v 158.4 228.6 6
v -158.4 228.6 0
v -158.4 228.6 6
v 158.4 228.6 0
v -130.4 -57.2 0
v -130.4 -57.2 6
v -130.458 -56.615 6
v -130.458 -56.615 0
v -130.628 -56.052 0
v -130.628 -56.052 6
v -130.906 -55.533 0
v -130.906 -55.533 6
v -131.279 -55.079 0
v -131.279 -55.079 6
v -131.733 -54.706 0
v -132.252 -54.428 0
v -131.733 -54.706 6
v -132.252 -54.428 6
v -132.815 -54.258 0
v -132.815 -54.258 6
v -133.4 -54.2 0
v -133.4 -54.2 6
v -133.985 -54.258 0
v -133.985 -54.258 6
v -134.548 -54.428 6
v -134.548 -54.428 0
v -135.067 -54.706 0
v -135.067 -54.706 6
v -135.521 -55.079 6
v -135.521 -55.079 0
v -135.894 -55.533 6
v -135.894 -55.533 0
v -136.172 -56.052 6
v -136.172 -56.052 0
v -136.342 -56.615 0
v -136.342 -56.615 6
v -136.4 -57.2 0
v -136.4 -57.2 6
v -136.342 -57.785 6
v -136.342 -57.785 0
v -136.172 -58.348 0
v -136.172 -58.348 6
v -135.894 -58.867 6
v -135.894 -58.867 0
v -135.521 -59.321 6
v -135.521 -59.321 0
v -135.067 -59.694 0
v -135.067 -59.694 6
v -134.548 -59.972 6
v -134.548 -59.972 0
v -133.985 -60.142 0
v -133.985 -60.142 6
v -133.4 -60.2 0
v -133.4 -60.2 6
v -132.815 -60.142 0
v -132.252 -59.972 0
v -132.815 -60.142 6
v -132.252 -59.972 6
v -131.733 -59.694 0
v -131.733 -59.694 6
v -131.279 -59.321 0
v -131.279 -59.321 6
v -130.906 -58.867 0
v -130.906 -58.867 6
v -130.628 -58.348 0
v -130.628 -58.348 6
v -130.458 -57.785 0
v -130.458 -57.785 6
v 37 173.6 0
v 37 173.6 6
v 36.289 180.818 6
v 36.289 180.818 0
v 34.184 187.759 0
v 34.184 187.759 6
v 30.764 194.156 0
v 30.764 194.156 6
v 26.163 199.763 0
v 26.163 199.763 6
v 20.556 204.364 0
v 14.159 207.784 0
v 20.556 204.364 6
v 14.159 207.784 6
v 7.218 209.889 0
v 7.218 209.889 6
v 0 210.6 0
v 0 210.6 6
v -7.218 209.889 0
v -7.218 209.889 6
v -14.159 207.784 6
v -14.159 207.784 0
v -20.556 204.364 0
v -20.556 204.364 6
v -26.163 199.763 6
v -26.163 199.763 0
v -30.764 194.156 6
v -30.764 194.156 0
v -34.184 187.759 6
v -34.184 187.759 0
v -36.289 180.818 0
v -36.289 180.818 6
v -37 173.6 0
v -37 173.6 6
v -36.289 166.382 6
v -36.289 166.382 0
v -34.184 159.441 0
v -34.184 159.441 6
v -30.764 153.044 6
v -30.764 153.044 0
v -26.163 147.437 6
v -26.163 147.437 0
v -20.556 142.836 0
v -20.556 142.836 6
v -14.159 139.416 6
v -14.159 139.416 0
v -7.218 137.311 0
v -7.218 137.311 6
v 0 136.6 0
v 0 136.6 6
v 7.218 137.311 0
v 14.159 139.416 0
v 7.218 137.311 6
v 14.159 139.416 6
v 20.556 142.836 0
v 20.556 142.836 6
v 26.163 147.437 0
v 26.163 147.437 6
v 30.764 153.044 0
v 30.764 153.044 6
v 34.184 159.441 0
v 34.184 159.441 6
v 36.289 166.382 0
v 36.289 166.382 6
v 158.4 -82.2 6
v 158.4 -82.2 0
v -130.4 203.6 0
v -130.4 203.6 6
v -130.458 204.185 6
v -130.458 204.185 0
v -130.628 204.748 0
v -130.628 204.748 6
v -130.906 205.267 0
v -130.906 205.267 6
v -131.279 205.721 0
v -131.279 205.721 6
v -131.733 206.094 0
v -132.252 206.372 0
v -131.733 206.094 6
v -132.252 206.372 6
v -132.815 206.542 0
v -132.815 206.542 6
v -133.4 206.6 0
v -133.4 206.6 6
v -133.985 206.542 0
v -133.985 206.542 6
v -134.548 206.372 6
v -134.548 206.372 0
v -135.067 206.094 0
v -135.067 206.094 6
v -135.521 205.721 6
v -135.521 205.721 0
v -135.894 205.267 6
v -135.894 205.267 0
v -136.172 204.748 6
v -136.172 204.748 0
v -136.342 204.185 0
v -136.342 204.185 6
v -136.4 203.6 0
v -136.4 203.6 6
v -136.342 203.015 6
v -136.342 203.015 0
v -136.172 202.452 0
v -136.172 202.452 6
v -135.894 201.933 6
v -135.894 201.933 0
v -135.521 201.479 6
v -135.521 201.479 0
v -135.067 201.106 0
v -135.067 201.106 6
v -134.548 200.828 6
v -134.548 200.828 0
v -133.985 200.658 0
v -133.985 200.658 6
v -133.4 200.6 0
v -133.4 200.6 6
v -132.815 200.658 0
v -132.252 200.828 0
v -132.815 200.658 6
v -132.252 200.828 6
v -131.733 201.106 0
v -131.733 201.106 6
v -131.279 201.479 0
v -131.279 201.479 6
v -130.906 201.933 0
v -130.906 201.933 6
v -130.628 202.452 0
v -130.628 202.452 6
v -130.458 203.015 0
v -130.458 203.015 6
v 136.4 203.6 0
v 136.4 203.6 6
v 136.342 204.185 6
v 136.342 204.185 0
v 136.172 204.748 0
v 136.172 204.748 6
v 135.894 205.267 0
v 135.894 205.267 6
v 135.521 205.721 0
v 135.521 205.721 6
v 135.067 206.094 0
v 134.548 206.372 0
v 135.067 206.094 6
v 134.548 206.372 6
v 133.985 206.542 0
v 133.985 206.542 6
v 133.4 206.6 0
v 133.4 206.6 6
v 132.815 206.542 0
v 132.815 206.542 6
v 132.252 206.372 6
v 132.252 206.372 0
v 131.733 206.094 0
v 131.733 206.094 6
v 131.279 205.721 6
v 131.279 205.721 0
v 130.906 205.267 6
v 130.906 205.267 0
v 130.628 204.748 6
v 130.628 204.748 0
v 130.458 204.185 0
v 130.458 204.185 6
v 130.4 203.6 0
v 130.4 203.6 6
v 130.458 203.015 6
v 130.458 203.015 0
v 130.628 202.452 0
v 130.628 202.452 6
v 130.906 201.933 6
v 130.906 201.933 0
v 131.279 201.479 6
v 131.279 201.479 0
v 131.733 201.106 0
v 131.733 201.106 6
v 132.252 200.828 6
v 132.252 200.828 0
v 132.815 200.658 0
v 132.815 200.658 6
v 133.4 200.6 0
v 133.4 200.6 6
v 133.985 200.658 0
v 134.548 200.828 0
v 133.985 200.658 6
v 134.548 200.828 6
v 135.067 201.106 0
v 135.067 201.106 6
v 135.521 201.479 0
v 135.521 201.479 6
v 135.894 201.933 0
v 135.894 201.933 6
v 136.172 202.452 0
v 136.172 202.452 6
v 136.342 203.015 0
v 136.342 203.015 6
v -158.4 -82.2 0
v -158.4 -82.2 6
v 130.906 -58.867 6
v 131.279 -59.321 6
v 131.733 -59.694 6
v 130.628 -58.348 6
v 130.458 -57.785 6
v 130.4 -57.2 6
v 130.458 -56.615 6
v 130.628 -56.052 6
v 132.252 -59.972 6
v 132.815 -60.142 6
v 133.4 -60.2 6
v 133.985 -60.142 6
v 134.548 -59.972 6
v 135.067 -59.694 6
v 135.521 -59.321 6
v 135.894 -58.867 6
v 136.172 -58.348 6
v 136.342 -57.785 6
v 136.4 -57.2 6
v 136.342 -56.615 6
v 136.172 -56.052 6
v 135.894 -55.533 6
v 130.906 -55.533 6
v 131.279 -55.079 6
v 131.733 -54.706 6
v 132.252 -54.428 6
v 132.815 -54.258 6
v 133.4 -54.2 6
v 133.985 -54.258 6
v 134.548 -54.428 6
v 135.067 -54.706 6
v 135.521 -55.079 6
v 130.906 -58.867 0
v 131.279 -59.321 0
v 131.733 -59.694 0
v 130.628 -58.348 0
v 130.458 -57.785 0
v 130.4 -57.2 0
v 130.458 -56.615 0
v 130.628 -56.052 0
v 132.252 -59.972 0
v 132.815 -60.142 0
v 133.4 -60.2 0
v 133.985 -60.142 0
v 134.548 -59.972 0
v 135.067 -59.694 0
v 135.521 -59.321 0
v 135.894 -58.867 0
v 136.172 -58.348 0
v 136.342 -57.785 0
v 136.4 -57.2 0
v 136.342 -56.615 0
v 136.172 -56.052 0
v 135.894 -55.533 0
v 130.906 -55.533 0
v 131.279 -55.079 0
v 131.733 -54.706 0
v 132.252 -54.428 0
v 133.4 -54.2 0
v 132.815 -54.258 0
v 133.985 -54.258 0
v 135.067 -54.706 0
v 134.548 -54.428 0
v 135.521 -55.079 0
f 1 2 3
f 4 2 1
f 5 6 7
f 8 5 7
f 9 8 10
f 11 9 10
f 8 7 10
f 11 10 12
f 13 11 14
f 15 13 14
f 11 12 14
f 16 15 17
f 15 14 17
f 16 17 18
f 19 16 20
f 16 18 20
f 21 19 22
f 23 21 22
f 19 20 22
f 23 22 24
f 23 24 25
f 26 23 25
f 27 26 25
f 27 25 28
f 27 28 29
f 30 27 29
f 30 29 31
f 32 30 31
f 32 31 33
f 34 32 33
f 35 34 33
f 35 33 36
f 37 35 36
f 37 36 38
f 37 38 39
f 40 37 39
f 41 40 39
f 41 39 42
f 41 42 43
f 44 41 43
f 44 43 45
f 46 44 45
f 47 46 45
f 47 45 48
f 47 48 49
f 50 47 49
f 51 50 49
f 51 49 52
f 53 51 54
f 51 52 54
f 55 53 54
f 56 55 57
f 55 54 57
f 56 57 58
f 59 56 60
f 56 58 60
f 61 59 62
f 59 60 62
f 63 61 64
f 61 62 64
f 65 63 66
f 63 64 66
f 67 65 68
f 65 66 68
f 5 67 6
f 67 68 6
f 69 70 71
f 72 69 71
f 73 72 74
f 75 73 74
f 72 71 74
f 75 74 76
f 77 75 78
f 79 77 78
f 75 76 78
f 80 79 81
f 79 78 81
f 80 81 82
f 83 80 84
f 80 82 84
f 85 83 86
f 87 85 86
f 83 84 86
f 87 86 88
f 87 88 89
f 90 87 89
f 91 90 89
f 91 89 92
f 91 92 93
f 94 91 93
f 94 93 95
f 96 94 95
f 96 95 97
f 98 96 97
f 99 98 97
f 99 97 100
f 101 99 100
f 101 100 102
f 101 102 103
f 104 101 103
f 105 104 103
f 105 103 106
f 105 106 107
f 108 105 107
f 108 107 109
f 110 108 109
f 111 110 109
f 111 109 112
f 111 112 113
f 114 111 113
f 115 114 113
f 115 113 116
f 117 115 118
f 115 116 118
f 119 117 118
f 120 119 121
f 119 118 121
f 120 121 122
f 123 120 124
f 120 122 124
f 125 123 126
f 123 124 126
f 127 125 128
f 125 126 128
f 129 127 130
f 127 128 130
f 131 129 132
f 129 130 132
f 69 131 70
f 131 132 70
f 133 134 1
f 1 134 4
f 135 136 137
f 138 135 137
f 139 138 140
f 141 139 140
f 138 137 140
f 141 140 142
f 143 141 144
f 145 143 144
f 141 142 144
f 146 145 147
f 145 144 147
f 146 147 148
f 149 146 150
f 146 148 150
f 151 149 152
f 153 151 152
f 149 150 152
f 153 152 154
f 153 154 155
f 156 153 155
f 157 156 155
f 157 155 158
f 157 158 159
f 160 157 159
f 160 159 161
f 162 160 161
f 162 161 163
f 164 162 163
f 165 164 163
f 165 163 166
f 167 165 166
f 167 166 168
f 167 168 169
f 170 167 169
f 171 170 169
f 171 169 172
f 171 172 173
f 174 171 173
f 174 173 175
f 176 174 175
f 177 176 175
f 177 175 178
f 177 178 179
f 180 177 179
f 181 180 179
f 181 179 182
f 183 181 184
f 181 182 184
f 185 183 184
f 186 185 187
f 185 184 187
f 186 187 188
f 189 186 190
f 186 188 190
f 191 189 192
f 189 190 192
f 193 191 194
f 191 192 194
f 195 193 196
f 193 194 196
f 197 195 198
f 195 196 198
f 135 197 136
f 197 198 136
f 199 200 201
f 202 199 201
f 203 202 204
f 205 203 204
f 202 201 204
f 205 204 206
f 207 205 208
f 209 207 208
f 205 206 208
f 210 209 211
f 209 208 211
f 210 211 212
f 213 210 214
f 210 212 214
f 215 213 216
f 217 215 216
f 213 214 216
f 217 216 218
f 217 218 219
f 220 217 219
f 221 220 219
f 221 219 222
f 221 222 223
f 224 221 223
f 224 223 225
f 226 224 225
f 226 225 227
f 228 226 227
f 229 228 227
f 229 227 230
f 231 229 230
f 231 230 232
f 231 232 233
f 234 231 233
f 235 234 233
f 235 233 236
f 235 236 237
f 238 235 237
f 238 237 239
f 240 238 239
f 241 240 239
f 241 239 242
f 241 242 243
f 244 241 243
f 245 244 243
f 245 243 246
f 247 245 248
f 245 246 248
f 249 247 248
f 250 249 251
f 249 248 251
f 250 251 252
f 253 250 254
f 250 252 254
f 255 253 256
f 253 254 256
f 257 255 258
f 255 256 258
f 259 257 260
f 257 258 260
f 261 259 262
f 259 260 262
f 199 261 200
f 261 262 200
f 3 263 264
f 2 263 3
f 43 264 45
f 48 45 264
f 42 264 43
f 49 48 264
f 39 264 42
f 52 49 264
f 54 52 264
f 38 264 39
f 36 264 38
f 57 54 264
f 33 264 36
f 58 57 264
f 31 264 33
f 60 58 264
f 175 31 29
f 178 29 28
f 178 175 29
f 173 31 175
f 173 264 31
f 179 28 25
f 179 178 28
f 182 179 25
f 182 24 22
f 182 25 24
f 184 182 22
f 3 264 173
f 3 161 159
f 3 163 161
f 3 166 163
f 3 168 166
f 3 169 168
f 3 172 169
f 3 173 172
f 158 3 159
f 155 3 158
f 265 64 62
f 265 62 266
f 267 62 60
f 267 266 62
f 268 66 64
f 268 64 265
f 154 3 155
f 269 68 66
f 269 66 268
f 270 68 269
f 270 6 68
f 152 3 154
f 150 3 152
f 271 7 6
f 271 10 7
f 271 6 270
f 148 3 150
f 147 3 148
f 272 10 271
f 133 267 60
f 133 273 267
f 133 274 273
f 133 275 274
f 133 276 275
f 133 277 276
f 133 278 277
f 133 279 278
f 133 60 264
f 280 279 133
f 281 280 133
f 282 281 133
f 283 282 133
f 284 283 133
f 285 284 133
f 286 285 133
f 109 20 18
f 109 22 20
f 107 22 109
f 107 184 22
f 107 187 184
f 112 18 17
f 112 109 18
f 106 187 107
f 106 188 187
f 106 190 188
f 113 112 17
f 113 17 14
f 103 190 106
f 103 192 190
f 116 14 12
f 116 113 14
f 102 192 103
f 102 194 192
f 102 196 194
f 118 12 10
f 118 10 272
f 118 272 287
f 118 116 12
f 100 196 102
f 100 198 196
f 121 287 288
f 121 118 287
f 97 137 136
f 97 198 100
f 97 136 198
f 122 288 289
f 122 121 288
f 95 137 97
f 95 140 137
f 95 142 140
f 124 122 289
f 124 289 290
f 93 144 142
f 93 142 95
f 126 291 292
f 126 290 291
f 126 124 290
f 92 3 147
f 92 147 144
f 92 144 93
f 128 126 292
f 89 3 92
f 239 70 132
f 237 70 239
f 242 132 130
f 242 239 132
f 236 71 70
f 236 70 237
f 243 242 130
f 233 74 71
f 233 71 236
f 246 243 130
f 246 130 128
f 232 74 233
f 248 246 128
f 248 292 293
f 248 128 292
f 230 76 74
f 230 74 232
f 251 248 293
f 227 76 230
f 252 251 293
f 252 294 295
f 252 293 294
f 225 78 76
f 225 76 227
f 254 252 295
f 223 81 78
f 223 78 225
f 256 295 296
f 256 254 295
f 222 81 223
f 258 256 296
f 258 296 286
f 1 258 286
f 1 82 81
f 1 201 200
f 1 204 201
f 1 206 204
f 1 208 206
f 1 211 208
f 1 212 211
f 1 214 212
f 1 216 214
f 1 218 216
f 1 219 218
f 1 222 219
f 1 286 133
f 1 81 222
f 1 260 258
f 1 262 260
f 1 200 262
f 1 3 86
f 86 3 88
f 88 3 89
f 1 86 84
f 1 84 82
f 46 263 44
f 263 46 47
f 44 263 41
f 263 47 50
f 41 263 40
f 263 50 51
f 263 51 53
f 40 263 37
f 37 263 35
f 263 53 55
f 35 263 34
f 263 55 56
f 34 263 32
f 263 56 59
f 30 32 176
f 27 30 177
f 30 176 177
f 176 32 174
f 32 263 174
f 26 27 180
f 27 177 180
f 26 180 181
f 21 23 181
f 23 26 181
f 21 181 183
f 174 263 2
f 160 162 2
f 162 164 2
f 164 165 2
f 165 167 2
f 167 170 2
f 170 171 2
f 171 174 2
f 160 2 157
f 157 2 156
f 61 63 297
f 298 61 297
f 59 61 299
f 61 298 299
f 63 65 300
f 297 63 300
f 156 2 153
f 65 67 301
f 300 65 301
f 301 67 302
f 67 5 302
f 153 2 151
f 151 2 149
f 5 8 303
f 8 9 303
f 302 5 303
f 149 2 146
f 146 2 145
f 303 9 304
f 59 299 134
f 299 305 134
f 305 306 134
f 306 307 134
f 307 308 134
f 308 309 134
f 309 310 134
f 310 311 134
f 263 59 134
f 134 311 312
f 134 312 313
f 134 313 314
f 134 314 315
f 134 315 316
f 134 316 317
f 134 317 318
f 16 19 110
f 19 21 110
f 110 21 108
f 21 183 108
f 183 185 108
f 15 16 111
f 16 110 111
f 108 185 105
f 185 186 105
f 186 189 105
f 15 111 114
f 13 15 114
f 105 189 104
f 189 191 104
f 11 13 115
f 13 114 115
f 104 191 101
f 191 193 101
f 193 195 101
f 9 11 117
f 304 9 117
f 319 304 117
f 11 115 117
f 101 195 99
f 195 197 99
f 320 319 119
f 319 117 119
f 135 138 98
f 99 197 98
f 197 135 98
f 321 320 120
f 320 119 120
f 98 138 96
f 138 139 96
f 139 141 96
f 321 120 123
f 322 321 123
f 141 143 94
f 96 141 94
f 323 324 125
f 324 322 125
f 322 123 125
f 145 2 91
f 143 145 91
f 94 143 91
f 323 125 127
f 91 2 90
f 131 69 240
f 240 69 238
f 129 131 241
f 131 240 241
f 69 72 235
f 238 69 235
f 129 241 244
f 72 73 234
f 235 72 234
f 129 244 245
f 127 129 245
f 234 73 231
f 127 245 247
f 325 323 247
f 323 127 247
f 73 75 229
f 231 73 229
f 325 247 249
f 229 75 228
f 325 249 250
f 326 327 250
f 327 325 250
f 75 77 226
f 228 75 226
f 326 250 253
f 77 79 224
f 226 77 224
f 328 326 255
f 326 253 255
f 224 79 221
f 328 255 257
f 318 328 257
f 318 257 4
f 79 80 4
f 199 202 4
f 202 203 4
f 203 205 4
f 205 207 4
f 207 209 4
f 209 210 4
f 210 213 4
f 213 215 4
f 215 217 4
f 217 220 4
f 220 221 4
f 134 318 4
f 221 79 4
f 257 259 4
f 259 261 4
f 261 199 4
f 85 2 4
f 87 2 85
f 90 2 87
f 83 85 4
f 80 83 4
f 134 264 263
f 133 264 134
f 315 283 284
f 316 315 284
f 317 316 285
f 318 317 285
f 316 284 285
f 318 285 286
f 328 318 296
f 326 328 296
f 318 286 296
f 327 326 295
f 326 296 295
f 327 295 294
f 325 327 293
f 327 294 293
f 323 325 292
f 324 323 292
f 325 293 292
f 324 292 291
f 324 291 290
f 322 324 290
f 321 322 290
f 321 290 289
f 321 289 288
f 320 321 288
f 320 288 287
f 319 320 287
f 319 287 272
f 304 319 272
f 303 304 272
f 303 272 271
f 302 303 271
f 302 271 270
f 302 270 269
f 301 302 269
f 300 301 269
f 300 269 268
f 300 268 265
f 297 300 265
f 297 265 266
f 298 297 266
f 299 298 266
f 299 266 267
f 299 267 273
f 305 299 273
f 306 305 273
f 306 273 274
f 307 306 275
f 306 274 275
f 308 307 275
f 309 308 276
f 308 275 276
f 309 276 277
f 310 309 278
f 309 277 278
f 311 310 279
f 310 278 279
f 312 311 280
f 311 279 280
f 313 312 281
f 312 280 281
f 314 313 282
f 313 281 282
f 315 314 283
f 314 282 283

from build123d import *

# Parameters (mm, degrees)
SKETCH1_W           = 316.8
SKETCH1_H           = 457.2
BOSS_EXTRUDE1_DEPTH = 6
SKETCH2_R           = 37
CUT_EXTRUDE1_DEPTH  = 279.180732618
SKETCH3_W           = 316.8
SKETCH3_H           = 146.4
CUT_EXTRUDE2_DEPTH  = 279.180732618
SKETCH4_R           = 3
CUT_EXTRUDE3_DEPTH  = 279.180732618


with BuildPart() as part:
    # Sketch1 → Boss-Extrude1 (new body)
    with BuildSketch(Plane.XY):
        Rectangle(SKETCH1_W, SKETCH1_H)
    extrude(amount=BOSS_EXTRUDE1_DEPTH)

    # Sketch2 → Cut-Extrude1 (cut, through all)
    with BuildSketch(Plane.XY.offset(6)):
        with Locations((0, 173.6)):
            Circle(SKETCH2_R)
    extrude(amount=-CUT_EXTRUDE1_DEPTH, mode=Mode.SUBTRACT)

    # Sketch3 → Cut-Extrude2 (cut, through all)
    with BuildSketch(Plane.XY.offset(6)):
        with Locations((0, -155.4)):
            Rectangle(SKETCH3_W, SKETCH3_H)
    extrude(amount=-CUT_EXTRUDE2_DEPTH, mode=Mode.SUBTRACT)

    # Sketch4 → Cut-Extrude3 (cut, through all)
    with BuildSketch(Plane.XY.offset(6)):
        with Locations((-133.4, 203.6)):
            Circle(SKETCH4_R)
        with Locations((-133.4, -57.2)):
            Circle(SKETCH4_R)
        with Locations((133.4, -57.2)):
            Circle(SKETCH4_R)
        with Locations((133.4, 203.6)):
            Circle(SKETCH4_R)
    extrude(amount=-CUT_EXTRUDE3_DEPTH, mode=Mode.SUBTRACT)


solid = part.part
